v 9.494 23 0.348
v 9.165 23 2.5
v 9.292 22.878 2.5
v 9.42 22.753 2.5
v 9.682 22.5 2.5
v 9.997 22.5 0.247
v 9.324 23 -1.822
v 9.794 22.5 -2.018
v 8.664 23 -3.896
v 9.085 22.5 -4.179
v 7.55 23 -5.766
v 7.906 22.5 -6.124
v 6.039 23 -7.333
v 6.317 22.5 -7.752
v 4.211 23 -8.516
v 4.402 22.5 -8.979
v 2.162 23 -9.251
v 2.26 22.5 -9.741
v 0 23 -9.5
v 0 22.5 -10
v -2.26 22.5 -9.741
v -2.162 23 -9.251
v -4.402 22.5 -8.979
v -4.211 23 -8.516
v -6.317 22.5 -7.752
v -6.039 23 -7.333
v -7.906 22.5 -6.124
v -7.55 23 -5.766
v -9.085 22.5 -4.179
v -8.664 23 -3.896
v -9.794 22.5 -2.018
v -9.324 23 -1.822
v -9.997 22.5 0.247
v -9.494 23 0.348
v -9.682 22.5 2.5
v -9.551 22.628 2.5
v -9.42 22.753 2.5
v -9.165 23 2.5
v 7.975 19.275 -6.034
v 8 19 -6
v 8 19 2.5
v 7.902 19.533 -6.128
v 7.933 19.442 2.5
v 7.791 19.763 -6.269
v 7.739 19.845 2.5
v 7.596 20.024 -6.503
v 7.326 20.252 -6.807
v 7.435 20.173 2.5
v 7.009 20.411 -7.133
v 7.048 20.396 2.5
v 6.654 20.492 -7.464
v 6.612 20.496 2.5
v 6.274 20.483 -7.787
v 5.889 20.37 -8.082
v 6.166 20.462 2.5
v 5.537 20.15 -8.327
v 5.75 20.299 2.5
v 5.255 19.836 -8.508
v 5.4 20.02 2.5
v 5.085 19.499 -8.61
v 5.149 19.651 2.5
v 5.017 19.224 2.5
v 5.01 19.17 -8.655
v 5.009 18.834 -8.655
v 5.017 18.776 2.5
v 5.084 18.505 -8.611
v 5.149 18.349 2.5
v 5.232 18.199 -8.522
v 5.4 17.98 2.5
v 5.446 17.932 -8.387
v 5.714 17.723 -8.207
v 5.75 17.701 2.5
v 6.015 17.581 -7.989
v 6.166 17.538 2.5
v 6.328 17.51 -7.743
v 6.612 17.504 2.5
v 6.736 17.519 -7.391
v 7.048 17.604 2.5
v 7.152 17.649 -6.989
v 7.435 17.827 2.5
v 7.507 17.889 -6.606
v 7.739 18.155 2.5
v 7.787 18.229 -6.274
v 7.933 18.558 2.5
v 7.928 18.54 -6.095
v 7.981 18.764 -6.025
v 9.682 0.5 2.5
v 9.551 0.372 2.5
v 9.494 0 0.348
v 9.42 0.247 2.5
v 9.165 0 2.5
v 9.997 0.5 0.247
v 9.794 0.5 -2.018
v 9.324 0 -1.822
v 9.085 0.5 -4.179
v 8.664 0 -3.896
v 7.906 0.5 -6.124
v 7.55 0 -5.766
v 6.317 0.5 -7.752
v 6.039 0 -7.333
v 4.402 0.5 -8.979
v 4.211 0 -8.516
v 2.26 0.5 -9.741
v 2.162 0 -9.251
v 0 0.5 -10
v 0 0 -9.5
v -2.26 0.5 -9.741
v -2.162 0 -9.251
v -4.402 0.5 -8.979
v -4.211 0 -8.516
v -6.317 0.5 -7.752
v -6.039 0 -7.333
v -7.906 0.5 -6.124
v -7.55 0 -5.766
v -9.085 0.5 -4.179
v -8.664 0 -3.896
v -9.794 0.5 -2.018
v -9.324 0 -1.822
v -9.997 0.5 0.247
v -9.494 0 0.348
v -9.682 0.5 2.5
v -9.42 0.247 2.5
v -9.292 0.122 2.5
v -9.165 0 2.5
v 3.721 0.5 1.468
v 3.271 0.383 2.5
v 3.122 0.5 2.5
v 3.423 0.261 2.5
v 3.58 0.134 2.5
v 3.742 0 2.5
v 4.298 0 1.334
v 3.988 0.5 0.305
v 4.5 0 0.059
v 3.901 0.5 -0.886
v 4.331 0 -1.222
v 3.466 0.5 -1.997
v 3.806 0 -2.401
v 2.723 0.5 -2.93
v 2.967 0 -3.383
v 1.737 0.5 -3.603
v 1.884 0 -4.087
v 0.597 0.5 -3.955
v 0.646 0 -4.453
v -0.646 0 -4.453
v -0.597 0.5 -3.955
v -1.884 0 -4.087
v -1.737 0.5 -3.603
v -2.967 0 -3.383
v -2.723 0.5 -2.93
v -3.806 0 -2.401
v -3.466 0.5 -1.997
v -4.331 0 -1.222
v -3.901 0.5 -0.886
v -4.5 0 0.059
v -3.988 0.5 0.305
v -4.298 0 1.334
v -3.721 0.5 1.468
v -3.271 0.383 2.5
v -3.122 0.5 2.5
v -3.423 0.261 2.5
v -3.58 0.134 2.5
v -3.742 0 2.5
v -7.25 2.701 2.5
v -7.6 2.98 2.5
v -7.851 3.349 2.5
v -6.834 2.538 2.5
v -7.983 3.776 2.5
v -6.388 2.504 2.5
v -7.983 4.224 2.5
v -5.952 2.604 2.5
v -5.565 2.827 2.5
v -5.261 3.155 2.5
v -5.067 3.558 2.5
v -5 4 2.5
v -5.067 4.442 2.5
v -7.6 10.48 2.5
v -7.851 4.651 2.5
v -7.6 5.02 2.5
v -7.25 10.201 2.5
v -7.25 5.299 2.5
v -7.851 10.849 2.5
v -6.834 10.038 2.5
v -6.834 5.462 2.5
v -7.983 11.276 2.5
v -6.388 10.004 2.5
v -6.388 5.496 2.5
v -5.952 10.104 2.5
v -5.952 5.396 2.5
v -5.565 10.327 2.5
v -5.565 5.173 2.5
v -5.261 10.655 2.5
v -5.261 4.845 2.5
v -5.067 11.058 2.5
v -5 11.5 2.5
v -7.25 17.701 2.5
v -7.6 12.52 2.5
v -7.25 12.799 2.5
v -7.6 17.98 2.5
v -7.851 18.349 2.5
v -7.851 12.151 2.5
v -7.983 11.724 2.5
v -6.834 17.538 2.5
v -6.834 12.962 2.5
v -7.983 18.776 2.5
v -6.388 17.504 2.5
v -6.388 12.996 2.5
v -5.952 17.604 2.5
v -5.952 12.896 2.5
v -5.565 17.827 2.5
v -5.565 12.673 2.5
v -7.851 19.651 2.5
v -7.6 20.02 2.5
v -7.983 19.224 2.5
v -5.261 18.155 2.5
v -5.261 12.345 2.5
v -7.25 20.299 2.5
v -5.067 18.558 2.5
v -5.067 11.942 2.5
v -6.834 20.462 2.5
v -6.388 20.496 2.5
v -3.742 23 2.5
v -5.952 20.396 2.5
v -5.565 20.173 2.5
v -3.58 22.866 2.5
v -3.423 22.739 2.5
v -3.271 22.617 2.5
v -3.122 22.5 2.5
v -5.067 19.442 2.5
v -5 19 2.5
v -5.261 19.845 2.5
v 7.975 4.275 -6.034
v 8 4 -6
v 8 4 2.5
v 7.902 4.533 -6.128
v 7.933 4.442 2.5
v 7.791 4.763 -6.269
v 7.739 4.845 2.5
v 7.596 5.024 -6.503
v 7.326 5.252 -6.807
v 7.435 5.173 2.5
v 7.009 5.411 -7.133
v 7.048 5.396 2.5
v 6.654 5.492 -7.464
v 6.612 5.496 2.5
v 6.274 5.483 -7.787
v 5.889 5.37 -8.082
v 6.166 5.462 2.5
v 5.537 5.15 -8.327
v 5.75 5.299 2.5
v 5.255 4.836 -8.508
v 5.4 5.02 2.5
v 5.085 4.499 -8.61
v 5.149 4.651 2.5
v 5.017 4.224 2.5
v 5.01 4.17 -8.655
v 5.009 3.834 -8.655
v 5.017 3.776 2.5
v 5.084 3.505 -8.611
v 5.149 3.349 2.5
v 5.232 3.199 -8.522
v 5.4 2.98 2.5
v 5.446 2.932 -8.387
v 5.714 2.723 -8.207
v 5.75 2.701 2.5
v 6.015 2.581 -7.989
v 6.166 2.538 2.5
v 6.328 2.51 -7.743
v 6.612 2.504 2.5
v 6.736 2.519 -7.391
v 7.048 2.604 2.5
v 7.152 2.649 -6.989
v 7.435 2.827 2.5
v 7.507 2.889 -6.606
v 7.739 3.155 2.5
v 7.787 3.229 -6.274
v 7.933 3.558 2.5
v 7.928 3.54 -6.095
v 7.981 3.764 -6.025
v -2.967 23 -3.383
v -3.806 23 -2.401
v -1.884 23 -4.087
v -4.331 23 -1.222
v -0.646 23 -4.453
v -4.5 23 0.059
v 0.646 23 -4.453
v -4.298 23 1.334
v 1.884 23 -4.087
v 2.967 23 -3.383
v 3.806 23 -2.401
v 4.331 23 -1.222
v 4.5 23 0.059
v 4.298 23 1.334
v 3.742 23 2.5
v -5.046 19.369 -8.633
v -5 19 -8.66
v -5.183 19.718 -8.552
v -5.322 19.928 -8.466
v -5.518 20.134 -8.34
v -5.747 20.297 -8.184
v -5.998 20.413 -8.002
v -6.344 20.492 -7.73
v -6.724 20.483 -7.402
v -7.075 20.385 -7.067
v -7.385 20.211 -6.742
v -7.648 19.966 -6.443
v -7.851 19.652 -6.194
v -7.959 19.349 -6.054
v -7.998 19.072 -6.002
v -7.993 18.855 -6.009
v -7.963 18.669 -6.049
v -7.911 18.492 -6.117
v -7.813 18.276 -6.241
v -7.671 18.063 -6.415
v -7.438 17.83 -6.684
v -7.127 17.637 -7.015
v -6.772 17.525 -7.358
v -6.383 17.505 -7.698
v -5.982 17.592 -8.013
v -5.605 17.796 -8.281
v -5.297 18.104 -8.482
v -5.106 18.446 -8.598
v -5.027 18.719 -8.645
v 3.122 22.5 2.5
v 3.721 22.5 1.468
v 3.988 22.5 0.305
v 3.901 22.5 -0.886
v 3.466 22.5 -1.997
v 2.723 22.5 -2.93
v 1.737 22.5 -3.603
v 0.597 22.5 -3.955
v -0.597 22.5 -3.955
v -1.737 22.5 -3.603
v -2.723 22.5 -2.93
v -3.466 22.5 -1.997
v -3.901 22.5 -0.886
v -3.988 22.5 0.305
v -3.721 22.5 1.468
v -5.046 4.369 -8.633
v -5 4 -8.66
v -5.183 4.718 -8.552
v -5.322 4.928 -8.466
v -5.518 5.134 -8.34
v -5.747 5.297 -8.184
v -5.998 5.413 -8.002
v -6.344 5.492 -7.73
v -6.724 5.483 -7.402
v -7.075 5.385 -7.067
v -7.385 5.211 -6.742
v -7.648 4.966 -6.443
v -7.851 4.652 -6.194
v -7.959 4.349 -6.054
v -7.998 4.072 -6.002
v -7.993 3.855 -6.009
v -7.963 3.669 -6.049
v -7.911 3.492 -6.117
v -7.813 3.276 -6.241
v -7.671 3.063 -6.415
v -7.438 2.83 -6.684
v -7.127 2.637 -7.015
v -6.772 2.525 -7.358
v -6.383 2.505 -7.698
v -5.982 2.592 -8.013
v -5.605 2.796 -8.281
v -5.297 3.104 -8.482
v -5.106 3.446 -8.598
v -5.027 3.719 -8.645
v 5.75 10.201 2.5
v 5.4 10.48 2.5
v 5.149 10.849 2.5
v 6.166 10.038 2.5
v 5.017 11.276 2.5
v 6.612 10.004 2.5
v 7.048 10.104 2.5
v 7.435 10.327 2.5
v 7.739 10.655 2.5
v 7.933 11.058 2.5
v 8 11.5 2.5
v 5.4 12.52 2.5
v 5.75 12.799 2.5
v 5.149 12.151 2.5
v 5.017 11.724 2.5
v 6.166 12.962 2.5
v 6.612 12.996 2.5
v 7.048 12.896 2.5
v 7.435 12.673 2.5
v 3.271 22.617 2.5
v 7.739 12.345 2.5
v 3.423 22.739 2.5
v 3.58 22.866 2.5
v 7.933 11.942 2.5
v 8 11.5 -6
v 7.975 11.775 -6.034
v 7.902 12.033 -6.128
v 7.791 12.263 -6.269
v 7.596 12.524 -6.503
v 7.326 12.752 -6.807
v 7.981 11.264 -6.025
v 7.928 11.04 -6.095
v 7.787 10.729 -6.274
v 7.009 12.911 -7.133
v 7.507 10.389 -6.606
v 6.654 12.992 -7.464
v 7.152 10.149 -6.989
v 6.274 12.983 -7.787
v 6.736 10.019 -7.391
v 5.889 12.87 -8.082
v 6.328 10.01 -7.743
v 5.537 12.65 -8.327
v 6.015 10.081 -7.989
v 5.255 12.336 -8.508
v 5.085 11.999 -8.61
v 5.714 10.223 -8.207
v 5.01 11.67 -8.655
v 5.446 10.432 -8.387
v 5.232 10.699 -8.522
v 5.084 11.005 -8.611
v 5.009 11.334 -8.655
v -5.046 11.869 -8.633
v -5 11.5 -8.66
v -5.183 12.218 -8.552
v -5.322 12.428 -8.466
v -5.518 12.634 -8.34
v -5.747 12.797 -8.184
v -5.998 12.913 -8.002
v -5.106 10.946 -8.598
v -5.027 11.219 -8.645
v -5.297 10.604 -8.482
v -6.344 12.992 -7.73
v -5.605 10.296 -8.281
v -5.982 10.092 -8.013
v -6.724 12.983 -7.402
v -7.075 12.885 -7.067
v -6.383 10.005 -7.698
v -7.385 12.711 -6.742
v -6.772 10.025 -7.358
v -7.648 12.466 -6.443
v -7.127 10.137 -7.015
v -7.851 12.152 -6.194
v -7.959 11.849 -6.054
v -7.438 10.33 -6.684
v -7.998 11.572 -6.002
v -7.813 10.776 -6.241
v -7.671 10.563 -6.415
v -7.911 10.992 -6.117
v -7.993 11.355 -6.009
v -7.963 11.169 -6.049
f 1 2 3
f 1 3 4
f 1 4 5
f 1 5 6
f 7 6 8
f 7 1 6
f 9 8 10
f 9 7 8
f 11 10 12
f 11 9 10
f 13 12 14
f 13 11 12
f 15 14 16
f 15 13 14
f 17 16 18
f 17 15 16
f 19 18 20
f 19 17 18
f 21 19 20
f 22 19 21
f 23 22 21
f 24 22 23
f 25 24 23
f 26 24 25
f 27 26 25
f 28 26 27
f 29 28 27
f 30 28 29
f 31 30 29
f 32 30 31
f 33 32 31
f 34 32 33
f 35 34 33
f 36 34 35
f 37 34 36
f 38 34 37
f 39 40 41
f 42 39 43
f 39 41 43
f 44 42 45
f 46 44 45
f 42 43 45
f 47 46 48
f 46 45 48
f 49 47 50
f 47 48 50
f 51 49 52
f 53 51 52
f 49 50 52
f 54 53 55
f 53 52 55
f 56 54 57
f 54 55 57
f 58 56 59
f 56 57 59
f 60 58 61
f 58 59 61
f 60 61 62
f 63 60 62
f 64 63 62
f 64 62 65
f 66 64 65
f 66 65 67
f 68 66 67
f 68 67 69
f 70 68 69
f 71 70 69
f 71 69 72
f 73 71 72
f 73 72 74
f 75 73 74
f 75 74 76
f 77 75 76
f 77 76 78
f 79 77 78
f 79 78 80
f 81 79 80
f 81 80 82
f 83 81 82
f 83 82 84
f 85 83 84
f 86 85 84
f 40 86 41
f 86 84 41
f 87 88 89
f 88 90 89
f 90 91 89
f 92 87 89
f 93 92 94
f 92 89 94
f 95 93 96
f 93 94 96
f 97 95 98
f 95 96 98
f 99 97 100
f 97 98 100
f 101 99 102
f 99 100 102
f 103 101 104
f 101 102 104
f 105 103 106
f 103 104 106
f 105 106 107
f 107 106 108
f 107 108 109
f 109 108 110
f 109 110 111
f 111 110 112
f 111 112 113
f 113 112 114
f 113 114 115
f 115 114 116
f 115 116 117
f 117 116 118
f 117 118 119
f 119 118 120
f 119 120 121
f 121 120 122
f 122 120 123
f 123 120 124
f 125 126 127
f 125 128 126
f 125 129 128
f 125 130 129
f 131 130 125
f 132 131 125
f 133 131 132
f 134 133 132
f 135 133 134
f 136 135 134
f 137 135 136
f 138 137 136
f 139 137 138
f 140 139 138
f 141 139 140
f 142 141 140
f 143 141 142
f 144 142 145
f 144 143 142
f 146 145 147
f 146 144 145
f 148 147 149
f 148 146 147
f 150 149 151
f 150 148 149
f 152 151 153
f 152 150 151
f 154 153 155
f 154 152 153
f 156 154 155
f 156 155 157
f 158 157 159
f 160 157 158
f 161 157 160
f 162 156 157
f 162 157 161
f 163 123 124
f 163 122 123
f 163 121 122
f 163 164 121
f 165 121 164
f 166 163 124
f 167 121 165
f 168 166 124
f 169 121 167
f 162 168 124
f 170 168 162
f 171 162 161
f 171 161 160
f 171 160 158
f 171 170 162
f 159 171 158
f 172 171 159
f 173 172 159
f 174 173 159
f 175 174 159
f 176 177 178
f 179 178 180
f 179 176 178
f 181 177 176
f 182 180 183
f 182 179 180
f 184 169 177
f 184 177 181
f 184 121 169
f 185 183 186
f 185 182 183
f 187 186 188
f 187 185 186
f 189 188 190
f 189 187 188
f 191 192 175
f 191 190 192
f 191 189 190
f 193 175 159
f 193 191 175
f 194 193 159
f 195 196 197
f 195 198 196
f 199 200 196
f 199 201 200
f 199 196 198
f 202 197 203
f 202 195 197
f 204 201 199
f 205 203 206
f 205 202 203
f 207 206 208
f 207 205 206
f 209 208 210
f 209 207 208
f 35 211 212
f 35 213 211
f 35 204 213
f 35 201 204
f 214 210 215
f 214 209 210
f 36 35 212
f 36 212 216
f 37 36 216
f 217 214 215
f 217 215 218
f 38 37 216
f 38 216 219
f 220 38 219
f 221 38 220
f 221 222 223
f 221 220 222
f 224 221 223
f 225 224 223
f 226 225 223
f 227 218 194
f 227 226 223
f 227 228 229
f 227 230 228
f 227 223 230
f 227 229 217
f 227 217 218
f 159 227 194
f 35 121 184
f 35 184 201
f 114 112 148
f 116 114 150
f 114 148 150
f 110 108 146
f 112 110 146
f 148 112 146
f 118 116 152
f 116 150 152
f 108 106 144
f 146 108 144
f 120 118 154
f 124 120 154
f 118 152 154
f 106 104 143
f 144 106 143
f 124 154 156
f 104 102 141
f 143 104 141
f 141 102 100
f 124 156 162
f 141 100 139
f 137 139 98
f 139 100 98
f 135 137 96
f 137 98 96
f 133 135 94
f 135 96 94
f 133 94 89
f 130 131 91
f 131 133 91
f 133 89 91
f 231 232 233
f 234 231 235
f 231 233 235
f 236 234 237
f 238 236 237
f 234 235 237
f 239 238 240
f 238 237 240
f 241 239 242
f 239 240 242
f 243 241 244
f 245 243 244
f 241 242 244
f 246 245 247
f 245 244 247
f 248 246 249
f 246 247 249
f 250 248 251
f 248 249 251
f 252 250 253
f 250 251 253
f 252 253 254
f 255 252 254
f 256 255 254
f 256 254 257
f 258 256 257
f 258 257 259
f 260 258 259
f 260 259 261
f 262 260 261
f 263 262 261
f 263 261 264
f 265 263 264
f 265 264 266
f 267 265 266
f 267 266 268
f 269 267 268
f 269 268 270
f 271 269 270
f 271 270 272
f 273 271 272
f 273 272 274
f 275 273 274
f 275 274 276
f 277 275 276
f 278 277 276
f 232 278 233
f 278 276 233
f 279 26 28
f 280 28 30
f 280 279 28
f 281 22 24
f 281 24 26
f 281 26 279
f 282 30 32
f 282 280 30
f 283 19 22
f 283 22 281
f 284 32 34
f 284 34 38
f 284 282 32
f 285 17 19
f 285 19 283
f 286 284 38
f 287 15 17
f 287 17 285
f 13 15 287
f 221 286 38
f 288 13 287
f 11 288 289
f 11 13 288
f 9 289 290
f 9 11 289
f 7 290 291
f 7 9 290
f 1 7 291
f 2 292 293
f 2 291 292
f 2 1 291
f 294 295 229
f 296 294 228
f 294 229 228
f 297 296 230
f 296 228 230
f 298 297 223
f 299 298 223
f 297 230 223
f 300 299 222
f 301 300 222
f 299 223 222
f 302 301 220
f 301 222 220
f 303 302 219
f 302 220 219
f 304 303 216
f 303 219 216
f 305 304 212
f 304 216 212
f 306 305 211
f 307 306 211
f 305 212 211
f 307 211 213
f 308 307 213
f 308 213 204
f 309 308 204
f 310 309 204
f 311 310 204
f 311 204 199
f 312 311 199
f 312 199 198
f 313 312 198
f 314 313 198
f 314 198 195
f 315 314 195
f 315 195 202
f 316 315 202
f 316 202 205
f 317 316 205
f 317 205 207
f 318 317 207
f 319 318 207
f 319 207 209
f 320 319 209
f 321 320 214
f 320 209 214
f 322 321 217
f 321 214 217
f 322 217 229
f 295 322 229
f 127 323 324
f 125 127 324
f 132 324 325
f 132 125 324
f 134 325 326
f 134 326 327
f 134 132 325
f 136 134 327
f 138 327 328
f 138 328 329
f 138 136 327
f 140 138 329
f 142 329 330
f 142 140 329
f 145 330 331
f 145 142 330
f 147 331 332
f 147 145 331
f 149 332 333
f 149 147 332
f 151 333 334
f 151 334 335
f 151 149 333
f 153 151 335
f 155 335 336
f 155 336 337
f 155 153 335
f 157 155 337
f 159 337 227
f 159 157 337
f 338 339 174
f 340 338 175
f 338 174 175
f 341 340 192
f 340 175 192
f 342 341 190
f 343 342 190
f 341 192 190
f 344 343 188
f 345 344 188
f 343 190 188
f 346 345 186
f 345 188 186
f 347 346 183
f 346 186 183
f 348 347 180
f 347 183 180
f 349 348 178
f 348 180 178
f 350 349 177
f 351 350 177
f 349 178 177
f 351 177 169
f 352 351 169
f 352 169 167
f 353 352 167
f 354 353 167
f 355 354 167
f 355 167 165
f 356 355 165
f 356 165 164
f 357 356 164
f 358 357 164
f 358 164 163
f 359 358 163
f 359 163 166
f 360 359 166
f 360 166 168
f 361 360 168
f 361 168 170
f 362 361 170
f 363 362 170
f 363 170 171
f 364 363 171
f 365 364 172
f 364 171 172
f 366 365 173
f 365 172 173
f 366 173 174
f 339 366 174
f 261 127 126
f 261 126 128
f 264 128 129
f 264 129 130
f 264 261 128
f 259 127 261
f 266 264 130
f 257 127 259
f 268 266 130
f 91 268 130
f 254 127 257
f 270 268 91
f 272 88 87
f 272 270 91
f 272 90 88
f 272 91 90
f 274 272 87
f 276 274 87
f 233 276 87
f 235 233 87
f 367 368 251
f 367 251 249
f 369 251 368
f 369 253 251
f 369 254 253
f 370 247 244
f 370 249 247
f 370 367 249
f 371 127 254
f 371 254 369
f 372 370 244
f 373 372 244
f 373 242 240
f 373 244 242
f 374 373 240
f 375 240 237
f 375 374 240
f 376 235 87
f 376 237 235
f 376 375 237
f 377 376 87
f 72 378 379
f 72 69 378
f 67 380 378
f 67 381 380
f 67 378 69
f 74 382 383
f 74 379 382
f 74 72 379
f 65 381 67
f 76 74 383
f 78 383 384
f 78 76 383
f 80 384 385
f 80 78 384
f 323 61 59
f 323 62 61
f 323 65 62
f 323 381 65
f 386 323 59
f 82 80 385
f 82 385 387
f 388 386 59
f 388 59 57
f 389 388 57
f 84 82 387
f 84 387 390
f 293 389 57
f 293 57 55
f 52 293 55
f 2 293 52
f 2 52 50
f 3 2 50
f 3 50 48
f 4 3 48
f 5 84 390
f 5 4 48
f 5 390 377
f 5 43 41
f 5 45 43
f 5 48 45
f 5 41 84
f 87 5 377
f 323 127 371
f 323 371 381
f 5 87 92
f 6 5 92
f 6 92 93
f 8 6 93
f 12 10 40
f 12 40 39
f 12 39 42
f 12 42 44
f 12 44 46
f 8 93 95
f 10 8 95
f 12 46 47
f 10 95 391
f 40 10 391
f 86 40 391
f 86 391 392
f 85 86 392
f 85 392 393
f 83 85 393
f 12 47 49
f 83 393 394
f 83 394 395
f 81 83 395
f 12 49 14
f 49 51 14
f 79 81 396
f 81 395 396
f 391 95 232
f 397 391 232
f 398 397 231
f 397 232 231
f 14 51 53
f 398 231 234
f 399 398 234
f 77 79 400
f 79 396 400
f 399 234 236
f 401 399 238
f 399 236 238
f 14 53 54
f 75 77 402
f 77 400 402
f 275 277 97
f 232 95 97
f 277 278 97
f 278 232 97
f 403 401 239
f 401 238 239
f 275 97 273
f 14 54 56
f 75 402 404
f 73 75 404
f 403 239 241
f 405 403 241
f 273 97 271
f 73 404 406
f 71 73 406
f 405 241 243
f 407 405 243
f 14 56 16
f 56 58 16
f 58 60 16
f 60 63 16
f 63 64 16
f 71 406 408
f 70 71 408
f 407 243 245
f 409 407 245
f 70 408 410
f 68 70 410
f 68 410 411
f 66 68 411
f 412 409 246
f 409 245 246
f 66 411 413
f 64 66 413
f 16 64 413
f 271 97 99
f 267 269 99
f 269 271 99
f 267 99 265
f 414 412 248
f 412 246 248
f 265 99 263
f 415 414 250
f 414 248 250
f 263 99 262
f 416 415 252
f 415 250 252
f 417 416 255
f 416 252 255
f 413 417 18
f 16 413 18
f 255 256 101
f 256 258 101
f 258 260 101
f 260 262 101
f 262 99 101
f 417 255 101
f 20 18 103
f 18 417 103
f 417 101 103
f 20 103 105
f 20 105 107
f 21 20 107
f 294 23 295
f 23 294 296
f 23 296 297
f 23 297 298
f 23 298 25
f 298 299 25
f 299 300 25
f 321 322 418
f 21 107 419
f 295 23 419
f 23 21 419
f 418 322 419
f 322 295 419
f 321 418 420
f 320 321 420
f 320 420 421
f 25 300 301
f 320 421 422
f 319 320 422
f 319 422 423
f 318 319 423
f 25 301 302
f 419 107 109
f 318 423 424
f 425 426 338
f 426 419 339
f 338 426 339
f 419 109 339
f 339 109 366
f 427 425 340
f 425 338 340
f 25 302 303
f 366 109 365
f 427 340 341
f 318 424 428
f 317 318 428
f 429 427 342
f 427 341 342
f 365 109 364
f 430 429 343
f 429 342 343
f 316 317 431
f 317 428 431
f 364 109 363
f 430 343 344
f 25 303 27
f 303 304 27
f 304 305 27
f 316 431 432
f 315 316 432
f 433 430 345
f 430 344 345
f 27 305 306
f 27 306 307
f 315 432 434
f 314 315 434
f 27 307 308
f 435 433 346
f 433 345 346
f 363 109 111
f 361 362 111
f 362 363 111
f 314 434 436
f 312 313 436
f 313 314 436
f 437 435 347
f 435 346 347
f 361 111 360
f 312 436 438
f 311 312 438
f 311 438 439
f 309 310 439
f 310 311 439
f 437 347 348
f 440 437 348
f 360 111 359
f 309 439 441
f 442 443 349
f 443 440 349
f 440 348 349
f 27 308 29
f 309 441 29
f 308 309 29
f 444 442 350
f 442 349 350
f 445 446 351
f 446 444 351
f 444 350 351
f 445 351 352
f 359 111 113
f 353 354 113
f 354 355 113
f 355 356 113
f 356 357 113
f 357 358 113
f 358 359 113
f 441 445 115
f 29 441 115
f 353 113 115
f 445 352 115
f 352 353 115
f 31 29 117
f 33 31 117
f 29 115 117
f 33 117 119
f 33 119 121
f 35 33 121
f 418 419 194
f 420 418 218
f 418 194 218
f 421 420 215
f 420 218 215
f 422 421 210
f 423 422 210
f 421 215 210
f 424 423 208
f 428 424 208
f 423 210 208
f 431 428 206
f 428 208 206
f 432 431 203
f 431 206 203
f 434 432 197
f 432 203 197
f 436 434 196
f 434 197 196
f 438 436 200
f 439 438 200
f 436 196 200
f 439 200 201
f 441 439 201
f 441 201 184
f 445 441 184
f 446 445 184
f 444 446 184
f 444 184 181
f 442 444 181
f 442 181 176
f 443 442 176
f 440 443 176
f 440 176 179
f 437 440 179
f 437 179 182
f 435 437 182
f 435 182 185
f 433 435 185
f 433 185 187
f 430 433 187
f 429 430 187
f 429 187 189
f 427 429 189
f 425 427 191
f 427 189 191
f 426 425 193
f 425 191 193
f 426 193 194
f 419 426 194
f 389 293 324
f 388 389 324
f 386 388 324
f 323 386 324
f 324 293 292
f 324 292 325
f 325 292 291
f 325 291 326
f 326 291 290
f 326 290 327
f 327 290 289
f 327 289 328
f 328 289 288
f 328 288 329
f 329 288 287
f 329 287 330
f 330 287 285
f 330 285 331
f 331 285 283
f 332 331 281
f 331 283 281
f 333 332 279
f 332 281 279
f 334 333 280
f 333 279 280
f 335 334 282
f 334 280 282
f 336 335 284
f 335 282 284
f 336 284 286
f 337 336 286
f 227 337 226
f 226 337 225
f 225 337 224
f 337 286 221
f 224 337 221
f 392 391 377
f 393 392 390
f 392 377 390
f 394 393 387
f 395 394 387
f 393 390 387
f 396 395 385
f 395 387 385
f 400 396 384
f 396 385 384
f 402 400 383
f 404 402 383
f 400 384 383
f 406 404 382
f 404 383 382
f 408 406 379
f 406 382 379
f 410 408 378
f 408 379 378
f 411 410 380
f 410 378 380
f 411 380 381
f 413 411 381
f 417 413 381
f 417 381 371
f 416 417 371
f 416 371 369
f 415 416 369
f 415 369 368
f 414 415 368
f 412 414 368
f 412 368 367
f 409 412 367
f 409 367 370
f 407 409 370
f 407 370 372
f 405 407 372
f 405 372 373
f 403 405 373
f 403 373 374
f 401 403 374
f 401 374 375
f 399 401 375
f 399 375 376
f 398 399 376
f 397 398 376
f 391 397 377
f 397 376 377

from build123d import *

# Parameters (mm, degrees)
SKETCH_1_R          = 10
SKETCH_1_R_2        = 4
EXTRUDE_1_DEPTH     = 23
CHAMFER_1_SIZE      = 0.5
SKETCH_2_W          = 20
SKETCH_2_H          = 23
CUT_EXTRUDE_1_DEPTH = 23
SKETCH_3_R          = 1.5
CUT_EXTRUDE_2_DEPTH = 29.022312538


with BuildPart() as part:
    # 草图1 → 凸台-拉伸1 (new body)
    with BuildSketch(Plane(origin=(0, 0, 0), x_dir=(1, 0, 0), z_dir=(0, 1, 0))):
        with Locations(Location((0, 0, 0), (0, 0, 270))):
            Circle(SKETCH_1_R)
        with Locations(Location((0, 0, 0), (0, 0, 270))):
            Circle(SKETCH_1_R_2, mode=Mode.SUBTRACT)
    extrude(amount=EXTRUDE_1_DEPTH)

    # 倒角1
    chamfer_1_edges = [part.edges().sort_by_distance(p)[0] for p in [
        (0, 0, -10),
        (0, 23, -10),
        (0, 0, -4),
        (0, 23, -4),
    ]]
    chamfer(chamfer_1_edges, length=CHAMFER_1_SIZE)

    # 草图2 → 切除-拉伸1 (cut)
    with BuildSketch(Plane.XY.offset(2.5)):
        with Locations((0, 11.5)):
            Rectangle(SKETCH_2_W, SKETCH_2_H)
    extrude(amount=CUT_EXTRUDE_1_DEPTH, mode=Mode.SUBTRACT)

    # 草图3 → 切除-拉伸2 (cut, through all)
    with BuildSketch(Plane.XY.offset(2.5)):
        with Locations((-6.5, 11.5)):
            Circle(SKETCH_3_R)
        with Locations((-6.5, 4)):
            Circle(SKETCH_3_R)
        with Locations((-6.5, 19)):
            Circle(SKETCH_3_R)
        with Locations((6.5, 19)):
            Circle(SKETCH_3_R)
        with Locations((6.5, 4)):
            Circle(SKETCH_3_R)
        with Locations((6.5, 11.5)):
            Circle(SKETCH_3_R)
    extrude(amount=-CUT_EXTRUDE_2_DEPTH, mode=Mode.SUBTRACT)


solid = part.part
